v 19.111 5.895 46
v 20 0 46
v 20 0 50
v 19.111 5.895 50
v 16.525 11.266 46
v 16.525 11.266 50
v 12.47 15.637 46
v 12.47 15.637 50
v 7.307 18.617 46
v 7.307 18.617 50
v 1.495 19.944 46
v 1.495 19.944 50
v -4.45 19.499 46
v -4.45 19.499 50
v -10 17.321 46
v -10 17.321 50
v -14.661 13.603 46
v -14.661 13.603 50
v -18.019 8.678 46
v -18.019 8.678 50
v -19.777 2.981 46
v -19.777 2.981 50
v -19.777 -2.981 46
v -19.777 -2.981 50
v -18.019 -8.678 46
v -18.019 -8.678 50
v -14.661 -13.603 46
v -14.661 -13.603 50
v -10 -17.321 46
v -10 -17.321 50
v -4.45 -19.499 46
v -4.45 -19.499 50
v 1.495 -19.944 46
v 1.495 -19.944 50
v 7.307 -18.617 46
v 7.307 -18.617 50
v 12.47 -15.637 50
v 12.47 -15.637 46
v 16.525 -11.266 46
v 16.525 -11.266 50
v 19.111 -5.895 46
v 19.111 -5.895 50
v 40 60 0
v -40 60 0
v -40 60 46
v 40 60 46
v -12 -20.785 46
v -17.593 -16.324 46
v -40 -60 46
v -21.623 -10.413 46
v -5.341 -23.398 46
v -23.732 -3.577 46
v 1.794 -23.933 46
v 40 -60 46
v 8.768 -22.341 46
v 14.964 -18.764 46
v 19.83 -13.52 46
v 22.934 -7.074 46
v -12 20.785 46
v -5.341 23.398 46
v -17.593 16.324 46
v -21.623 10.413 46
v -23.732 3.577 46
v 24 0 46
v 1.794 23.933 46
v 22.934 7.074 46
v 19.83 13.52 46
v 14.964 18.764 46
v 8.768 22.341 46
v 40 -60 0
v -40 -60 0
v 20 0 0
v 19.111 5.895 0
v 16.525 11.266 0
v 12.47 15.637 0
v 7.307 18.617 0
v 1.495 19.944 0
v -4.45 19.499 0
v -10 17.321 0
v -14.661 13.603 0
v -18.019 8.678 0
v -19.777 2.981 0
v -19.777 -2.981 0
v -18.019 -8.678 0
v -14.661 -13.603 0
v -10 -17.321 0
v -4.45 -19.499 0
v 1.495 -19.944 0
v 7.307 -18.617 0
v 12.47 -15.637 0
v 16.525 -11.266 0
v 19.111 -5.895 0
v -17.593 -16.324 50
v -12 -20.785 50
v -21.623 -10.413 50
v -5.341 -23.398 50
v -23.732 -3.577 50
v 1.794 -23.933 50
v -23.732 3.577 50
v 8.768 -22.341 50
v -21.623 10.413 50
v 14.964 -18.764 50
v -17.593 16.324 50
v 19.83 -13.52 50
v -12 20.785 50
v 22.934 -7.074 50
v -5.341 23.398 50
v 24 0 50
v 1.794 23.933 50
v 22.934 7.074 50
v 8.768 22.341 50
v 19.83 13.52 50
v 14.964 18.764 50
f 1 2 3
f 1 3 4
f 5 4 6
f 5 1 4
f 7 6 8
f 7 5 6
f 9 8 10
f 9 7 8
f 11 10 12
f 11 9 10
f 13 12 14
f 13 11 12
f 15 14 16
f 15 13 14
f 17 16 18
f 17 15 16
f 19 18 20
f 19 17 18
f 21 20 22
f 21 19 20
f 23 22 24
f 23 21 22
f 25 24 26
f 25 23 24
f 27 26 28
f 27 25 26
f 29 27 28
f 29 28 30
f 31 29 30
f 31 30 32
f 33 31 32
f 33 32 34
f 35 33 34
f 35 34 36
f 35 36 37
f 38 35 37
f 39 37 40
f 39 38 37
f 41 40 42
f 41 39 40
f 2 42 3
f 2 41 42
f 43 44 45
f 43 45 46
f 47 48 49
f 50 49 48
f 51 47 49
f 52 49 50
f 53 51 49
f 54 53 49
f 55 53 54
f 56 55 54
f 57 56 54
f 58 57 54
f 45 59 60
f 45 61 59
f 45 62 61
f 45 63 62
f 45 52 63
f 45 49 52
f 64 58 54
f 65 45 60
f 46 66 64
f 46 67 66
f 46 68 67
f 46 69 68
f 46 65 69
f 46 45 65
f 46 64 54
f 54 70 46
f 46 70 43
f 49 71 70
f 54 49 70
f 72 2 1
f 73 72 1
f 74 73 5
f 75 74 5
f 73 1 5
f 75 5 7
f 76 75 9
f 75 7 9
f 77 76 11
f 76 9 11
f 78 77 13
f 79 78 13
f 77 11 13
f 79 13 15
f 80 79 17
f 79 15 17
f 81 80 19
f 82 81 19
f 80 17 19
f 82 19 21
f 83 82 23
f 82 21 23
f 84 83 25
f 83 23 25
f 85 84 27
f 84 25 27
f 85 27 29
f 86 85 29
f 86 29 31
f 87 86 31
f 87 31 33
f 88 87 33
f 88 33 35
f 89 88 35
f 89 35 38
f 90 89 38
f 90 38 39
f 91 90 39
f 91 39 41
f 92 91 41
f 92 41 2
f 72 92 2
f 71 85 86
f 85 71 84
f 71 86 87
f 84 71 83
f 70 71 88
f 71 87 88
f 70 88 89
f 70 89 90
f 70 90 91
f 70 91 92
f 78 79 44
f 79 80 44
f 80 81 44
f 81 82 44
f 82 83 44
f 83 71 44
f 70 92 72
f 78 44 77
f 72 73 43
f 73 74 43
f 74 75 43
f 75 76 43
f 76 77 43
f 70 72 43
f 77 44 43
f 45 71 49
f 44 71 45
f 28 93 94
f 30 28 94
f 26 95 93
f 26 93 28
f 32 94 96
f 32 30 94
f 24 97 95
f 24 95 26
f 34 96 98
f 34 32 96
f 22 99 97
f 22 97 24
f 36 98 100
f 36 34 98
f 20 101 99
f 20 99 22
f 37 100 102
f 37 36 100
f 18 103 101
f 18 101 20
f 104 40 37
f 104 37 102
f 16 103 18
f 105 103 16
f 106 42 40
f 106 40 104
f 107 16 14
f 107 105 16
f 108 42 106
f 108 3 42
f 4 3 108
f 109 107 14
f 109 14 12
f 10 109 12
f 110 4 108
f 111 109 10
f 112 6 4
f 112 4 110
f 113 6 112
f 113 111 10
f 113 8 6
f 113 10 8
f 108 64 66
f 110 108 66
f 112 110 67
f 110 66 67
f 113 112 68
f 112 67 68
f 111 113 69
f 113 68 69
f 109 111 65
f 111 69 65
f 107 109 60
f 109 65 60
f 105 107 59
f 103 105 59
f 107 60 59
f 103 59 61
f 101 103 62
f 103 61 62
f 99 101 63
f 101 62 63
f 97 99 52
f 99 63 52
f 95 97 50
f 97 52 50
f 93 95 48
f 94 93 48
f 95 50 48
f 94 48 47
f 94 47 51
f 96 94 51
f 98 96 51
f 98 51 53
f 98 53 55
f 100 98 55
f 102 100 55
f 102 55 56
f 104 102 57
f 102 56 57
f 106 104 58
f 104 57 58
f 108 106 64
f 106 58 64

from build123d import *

# Parameters (mm, degrees)
F0_W     = 80
F0_H     = 120
F1_DEPTH = 46
F2_R     = 20
F3_DEPTH = 65
F2_R_2   = 24
F4_DEPTH = 4


with BuildPart() as f1:
    # F0 (on Top) → F1 (new body)
    with BuildSketch(Plane.XY):
        Rectangle(F0_W, F0_H)
    extrude(amount=F1_DEPTH)

    # F2 (on face) → F3 (cut)
    with BuildSketch(Plane.XY.offset(46)):
        Circle(F2_R)
    extrude(amount=-F3_DEPTH, mode=Mode.SUBTRACT)

    # F2 (on face) → F4 (join)
    with BuildSketch(Plane.XY.offset(46)):
        Circle(F2_R_2)
        Circle(F2_R, mode=Mode.SUBTRACT)
    extrude(amount=F4_DEPTH)


solid = f1.part
